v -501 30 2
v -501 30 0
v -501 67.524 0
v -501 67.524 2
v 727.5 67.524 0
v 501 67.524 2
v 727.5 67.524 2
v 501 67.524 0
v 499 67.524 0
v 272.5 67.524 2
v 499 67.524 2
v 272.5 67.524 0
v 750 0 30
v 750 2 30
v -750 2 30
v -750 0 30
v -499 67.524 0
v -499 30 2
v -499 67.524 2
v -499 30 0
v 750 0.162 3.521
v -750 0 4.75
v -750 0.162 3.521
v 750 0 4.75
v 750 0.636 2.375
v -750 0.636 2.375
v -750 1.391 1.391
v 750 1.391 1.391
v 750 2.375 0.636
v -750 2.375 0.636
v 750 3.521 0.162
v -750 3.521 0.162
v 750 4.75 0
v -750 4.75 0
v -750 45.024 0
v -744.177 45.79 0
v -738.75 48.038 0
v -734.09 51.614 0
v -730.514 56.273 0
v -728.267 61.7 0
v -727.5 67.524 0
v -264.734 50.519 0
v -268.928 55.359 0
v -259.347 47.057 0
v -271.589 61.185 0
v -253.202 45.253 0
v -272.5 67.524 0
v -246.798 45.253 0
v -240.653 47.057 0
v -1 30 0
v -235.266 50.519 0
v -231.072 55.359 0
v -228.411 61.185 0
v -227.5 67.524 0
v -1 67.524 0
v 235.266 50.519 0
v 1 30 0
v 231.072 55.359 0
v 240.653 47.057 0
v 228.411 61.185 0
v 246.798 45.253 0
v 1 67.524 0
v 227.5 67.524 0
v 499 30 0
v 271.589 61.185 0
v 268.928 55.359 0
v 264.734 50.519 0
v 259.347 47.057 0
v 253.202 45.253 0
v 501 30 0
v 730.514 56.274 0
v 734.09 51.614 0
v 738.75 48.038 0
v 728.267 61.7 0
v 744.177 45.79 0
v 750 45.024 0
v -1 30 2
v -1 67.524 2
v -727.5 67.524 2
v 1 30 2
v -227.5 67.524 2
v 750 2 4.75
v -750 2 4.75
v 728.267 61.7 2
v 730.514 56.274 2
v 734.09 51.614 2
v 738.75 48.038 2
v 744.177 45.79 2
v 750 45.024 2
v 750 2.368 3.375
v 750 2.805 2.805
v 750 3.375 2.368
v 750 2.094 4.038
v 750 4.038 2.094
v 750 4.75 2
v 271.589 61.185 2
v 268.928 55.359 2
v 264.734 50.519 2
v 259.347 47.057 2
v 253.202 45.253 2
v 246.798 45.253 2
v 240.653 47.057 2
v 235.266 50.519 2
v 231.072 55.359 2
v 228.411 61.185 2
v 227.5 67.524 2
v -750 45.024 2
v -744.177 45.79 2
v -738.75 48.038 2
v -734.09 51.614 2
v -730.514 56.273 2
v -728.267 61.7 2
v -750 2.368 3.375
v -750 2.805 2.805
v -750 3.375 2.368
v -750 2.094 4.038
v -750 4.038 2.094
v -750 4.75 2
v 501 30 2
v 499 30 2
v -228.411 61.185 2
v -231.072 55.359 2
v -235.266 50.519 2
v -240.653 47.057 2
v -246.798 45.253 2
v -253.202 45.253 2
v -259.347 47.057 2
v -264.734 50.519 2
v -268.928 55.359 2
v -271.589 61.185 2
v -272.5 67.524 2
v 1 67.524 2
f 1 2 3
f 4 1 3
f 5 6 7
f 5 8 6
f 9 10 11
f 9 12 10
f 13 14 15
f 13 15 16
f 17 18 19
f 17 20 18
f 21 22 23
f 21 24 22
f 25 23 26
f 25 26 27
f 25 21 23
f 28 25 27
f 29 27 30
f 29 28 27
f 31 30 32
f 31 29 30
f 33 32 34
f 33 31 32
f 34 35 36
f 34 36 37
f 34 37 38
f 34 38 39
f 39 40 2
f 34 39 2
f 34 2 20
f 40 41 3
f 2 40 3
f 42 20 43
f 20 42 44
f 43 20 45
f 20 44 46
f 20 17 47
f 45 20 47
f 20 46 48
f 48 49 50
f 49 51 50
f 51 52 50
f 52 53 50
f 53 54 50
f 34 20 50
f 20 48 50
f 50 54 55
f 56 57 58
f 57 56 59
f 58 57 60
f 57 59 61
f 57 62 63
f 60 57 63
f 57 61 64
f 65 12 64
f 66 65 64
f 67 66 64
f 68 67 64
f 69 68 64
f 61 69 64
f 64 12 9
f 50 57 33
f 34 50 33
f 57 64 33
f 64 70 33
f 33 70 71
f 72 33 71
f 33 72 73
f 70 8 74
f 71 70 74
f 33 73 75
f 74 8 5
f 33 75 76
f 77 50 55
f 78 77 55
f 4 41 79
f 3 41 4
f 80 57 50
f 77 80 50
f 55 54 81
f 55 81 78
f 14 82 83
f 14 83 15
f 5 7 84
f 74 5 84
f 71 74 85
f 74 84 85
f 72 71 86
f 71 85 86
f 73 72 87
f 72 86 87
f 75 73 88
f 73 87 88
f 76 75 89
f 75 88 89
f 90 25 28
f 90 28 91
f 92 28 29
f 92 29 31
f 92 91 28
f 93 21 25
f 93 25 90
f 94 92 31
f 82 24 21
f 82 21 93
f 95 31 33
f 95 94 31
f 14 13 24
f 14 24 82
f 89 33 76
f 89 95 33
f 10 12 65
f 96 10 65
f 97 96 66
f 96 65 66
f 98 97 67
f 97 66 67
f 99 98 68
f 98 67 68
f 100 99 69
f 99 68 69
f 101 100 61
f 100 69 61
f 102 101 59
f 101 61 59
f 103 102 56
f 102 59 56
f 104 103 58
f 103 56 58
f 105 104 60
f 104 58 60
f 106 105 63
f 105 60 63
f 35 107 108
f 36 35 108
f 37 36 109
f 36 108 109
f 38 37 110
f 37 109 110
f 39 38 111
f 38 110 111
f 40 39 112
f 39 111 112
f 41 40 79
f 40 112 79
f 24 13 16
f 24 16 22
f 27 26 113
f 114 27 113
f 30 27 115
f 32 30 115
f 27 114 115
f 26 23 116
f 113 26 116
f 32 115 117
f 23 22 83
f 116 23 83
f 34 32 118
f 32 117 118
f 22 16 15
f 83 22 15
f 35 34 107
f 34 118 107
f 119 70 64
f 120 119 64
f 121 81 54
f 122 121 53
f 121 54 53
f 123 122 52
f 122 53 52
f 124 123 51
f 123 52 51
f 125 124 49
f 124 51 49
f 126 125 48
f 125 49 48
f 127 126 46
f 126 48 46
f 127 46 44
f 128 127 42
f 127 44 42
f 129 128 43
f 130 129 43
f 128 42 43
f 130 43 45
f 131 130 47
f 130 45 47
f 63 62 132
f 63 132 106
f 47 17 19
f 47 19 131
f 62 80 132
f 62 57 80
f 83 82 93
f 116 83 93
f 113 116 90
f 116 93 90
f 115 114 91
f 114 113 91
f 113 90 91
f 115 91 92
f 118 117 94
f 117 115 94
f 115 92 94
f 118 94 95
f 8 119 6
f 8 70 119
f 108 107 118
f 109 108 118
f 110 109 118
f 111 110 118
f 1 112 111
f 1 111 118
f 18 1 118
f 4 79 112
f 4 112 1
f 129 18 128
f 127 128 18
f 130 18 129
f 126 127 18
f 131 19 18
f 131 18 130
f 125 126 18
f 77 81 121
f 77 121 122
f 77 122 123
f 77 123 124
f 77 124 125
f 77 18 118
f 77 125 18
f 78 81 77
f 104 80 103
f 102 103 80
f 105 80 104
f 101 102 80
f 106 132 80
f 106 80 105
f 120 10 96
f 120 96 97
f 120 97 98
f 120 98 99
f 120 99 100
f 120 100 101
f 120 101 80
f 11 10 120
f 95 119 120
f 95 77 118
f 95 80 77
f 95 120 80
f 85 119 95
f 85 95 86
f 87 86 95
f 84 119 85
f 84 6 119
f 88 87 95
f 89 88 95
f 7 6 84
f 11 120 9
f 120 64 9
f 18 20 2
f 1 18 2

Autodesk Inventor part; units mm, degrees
ref_plane "YZ Plane" through (0, 0, 0) normal (1, 0, 0) x (0, 1, 0)
ref_plane "XZ Plane" through (0, 0, 0) normal (0, 1, 0) x (-1, 0, 0)
ref_plane "XY Plane" through (0, 0, 0) normal (0, 0, 1) x (1, 0, 0)
sketch "Sketch1" plane through (0, 0, 0) normal (0, 0, 1) x (1, 0, 0)
  line L0 (-750, 67.5235) -> (750, 67.5235)
  line L1 (750, 67.5235) -> (750, 0)
  line L2 (750, 0) -> (-750, 0)
  line L3 (-750, 0) -> (-750, 67.5235)
  point P0 (0, 0)
  point P1 (0, 0)
  dimension "d0" = 1500
  dimension "d1" = 67.5235
extrude "Plate1" add sketch "Sketch1" along normal blind 2
sketch "Sketch2" plane through (750, 2, 0) normal (0, -1, 0) x (1, 0, 0)
  line L0 (-1500, 0) -> (0, 0)
  line L1 (0, 0) -> (0, 30)
  line L2 (0, 30) -> (-1500, 30)
  line L3 (-1500, 30) -> (-1500, 0)
edge flange "Flange1" height 30 angle 90 thickness 2 bend radius 2.75 thickness toward (0, -1, 0) relief round relief width 2 relief depth 1 edges at (0, 0, 2) wall of the first edge with corners at (-750, 2, 0) (750, 2, 0) (750, 2, 30) (-750, 2, 30)
bend "Bend1"
corner "Corner1"
sketch "Sketch5" plane through (0, 0, 0) normal (0, 0, -1) x (-1, 0, 0)
  line L0 (750, 67.5235) -> (-750, 67.5235) projected
  line L1 (-1, 30) -> (-1, 67.5235)
  line L2 (750, 0) -> (-750, 0) projected
  line L3 (-1, 30) -> (1, 30)
  line L4 (1, 30) -> (1, 67.5235)
  point P0 (0, 0)
  point P1 (0, 30)
  point P2 (0, 0)
  dimension "d27" = 2
  dimension "d28" = 30
extrude "Extrusion1" cut sketch "Sketch5" against normal through all
pattern_linear "Rectangular Pattern1" count 3 spacing 500 along (1, 0, 0) of "Extrusion1" first direction both ways yes
sketch "Sketch6" plane through (0, 0, 0) normal (0, 0, -1) x (-1, 0, 0)
  line L0 (-750, 67.5235) -> (-750, 4.75) projected
  circle A0 centre (-750, 67.5235) radius 22.5
  line L1 (-750, 67.5235) -> (750, 67.5235) projected
  line L2 (-1, 30) -> (-1, 67.5235) projected
  line L3 (-499, 67.5235) -> (-499, 30) projected
  line L4 (-1, 30) -> (-499, 30) construction
  circle A1 centre (-250, 67.5235) radius 22.5
  point P0 (0, 0)
  point P1 (-727.5, 67.5235)
  point P2 (-750, 45.0235)
  point P3 (-250, 30)
  dimension "d24" = 45
extrude "Extrusion2" cut sketch "Sketch6" along normal mid plane 30 contours L1 A0 L0 | A1 L1 | L1 A1 picked at (-748.3311, 52.7115)
mirror "Mirror1" about plane through (0, 0, 0) normal (1, 0, 0) of "Extrusion2"
sketch "Sketch7" plane through (0, 0, 2) normal (0, 0, 1) x (1, 0, 0)
  arc A0 (-750, 45.0235) -> (-727.5, 67.5235) centre (-750, 67.5235) ccw projected
  line L0 (-750, 4.75) -> (-750, 45.0235) projected
  line L1 (-750, 4.75) -> (750, 4.75) projected
  line L2 (750, 45.0235) -> (750, 4.75) projected
  arc A1 (727.5, 67.5235) -> (750, 45.0235) centre (750, 67.5235) ccw projected
  line L3 (501, 67.5235) -> (727.5, 67.5235) projected
  line L4 (501, 67.5235) -> (501, 30) projected
  line L5 (501, 30) -> (499, 30) projected
  line L6 (499, 30) -> (499, 67.5235) projected
  line L7 (1, 67.5235) -> (227.5, 67.5235) projected
  line L8 (1, 67.5235) -> (1, 30) projected
  line L9 (1, 30) -> (-1, 30) projected
  line L10 (-1, 30) -> (-1, 67.5235) projected
  line L11 (-499, 67.5235) -> (-272.5, 67.5235) projected
  line L12 (-499, 67.5235) -> (-499, 30) projected
  line L13 (-499, 30) -> (-501, 30) projected
  line L14 (-501, 30) -> (-501, 67.5235) projected
  line L15 (-727.5, 67.5235) -> (-501, 67.5235) projected
  line L16 (650, 4.75) -> (650, 67.5235) construction
  line L17 (-750, 4.75) -> (750, 4.75) projected
  circle A2 centre (650, 36.1368) radius 5
  line L18 (272.5, 67.5235) -> (499, 67.5235) projected
  arc A3 (227.5, 67.5235) -> (272.5, 67.5235) centre (250, 67.5235) ccw projected
  line L19 (-227.5, 67.5235) -> (-1, 67.5235) projected
  arc A4 (-272.5, 67.5235) -> (-227.5, 67.5235) centre (-250, 67.5235) ccw projected
  point P0 (0, 0)
  dimension "d29" = 100
  dimension "d30" = 10
extrude "Extrusion3" [suppressed]
mirror "Mirror2" [suppressed]
sketch "Sketch8" plane through (0, 0, 2) normal (0, 0, 1) x (1, 0, 0)
  line L0 (494, 62.5235) -> (494, 50.5235) construction
  line L1 (494, 50.5235) -> (294, 50.5235) construction
  line L2 (294, 50.5235) -> (294, 62.5235) construction
  line L3 (294, 62.5235) -> (494, 62.5235) construction
  line L4 (501, 67.5235) -> (727.5, 67.5235) projected
  line L5 (272.5, 67.5235) -> (499, 67.5235) projected
  point P0 (0, 0)
  dimension "d33" = 200
  dimension "d34" = 12
  dimension "d37" = 5
  dimension "d38" = 5
mark "Mark2"
equation "\"d28\" = Стрингер_глубина_паза"
equation "\"d1\" = Стрингер_3"
equation "\"d27\" = d18"
equation "\"d2\" = Thickness"
equation "\"d3\" = BendReliefWidth"
equation "\"d4\" = BendReliefDepth"
equation "\"d5\" = MinimumRemnant"
equation "\"d6\" = TransitionRadius"
equation "\"d9\" = BendRadius"
equation "\"d10\" = CornerReliefSize"
equation "\"d11\" = GapSize"
equation "\"d12\" = JacobiRadiusSize"
equation "\"BendReliefWidth\" = Thickness"
equation "\"BendReliefDepth\" = 0.5 * Thickness"
equation "\"CornerReliefSize\" = 4 * Thickness"
equation "\"MinimumRemnant\" = 2 * Thickness"
equation "\"TransitionRadius\" = BendRadius"
equation "\"JacobiRadiusSize\" = BendRadius"
equation "\"GapSize\" = Thickness"
equation "\"d18\" = Thickness"
equation "\"Стрингер_3\" = 67.5235"
equation "\"Thickness\" = 2"
equation "\"BendRadius\" = 2.75"
equation "\"Стрингер_глубина_паза\" = 30"
properties part number "MSC 053 stringer board #" material "Stainless Steel"
